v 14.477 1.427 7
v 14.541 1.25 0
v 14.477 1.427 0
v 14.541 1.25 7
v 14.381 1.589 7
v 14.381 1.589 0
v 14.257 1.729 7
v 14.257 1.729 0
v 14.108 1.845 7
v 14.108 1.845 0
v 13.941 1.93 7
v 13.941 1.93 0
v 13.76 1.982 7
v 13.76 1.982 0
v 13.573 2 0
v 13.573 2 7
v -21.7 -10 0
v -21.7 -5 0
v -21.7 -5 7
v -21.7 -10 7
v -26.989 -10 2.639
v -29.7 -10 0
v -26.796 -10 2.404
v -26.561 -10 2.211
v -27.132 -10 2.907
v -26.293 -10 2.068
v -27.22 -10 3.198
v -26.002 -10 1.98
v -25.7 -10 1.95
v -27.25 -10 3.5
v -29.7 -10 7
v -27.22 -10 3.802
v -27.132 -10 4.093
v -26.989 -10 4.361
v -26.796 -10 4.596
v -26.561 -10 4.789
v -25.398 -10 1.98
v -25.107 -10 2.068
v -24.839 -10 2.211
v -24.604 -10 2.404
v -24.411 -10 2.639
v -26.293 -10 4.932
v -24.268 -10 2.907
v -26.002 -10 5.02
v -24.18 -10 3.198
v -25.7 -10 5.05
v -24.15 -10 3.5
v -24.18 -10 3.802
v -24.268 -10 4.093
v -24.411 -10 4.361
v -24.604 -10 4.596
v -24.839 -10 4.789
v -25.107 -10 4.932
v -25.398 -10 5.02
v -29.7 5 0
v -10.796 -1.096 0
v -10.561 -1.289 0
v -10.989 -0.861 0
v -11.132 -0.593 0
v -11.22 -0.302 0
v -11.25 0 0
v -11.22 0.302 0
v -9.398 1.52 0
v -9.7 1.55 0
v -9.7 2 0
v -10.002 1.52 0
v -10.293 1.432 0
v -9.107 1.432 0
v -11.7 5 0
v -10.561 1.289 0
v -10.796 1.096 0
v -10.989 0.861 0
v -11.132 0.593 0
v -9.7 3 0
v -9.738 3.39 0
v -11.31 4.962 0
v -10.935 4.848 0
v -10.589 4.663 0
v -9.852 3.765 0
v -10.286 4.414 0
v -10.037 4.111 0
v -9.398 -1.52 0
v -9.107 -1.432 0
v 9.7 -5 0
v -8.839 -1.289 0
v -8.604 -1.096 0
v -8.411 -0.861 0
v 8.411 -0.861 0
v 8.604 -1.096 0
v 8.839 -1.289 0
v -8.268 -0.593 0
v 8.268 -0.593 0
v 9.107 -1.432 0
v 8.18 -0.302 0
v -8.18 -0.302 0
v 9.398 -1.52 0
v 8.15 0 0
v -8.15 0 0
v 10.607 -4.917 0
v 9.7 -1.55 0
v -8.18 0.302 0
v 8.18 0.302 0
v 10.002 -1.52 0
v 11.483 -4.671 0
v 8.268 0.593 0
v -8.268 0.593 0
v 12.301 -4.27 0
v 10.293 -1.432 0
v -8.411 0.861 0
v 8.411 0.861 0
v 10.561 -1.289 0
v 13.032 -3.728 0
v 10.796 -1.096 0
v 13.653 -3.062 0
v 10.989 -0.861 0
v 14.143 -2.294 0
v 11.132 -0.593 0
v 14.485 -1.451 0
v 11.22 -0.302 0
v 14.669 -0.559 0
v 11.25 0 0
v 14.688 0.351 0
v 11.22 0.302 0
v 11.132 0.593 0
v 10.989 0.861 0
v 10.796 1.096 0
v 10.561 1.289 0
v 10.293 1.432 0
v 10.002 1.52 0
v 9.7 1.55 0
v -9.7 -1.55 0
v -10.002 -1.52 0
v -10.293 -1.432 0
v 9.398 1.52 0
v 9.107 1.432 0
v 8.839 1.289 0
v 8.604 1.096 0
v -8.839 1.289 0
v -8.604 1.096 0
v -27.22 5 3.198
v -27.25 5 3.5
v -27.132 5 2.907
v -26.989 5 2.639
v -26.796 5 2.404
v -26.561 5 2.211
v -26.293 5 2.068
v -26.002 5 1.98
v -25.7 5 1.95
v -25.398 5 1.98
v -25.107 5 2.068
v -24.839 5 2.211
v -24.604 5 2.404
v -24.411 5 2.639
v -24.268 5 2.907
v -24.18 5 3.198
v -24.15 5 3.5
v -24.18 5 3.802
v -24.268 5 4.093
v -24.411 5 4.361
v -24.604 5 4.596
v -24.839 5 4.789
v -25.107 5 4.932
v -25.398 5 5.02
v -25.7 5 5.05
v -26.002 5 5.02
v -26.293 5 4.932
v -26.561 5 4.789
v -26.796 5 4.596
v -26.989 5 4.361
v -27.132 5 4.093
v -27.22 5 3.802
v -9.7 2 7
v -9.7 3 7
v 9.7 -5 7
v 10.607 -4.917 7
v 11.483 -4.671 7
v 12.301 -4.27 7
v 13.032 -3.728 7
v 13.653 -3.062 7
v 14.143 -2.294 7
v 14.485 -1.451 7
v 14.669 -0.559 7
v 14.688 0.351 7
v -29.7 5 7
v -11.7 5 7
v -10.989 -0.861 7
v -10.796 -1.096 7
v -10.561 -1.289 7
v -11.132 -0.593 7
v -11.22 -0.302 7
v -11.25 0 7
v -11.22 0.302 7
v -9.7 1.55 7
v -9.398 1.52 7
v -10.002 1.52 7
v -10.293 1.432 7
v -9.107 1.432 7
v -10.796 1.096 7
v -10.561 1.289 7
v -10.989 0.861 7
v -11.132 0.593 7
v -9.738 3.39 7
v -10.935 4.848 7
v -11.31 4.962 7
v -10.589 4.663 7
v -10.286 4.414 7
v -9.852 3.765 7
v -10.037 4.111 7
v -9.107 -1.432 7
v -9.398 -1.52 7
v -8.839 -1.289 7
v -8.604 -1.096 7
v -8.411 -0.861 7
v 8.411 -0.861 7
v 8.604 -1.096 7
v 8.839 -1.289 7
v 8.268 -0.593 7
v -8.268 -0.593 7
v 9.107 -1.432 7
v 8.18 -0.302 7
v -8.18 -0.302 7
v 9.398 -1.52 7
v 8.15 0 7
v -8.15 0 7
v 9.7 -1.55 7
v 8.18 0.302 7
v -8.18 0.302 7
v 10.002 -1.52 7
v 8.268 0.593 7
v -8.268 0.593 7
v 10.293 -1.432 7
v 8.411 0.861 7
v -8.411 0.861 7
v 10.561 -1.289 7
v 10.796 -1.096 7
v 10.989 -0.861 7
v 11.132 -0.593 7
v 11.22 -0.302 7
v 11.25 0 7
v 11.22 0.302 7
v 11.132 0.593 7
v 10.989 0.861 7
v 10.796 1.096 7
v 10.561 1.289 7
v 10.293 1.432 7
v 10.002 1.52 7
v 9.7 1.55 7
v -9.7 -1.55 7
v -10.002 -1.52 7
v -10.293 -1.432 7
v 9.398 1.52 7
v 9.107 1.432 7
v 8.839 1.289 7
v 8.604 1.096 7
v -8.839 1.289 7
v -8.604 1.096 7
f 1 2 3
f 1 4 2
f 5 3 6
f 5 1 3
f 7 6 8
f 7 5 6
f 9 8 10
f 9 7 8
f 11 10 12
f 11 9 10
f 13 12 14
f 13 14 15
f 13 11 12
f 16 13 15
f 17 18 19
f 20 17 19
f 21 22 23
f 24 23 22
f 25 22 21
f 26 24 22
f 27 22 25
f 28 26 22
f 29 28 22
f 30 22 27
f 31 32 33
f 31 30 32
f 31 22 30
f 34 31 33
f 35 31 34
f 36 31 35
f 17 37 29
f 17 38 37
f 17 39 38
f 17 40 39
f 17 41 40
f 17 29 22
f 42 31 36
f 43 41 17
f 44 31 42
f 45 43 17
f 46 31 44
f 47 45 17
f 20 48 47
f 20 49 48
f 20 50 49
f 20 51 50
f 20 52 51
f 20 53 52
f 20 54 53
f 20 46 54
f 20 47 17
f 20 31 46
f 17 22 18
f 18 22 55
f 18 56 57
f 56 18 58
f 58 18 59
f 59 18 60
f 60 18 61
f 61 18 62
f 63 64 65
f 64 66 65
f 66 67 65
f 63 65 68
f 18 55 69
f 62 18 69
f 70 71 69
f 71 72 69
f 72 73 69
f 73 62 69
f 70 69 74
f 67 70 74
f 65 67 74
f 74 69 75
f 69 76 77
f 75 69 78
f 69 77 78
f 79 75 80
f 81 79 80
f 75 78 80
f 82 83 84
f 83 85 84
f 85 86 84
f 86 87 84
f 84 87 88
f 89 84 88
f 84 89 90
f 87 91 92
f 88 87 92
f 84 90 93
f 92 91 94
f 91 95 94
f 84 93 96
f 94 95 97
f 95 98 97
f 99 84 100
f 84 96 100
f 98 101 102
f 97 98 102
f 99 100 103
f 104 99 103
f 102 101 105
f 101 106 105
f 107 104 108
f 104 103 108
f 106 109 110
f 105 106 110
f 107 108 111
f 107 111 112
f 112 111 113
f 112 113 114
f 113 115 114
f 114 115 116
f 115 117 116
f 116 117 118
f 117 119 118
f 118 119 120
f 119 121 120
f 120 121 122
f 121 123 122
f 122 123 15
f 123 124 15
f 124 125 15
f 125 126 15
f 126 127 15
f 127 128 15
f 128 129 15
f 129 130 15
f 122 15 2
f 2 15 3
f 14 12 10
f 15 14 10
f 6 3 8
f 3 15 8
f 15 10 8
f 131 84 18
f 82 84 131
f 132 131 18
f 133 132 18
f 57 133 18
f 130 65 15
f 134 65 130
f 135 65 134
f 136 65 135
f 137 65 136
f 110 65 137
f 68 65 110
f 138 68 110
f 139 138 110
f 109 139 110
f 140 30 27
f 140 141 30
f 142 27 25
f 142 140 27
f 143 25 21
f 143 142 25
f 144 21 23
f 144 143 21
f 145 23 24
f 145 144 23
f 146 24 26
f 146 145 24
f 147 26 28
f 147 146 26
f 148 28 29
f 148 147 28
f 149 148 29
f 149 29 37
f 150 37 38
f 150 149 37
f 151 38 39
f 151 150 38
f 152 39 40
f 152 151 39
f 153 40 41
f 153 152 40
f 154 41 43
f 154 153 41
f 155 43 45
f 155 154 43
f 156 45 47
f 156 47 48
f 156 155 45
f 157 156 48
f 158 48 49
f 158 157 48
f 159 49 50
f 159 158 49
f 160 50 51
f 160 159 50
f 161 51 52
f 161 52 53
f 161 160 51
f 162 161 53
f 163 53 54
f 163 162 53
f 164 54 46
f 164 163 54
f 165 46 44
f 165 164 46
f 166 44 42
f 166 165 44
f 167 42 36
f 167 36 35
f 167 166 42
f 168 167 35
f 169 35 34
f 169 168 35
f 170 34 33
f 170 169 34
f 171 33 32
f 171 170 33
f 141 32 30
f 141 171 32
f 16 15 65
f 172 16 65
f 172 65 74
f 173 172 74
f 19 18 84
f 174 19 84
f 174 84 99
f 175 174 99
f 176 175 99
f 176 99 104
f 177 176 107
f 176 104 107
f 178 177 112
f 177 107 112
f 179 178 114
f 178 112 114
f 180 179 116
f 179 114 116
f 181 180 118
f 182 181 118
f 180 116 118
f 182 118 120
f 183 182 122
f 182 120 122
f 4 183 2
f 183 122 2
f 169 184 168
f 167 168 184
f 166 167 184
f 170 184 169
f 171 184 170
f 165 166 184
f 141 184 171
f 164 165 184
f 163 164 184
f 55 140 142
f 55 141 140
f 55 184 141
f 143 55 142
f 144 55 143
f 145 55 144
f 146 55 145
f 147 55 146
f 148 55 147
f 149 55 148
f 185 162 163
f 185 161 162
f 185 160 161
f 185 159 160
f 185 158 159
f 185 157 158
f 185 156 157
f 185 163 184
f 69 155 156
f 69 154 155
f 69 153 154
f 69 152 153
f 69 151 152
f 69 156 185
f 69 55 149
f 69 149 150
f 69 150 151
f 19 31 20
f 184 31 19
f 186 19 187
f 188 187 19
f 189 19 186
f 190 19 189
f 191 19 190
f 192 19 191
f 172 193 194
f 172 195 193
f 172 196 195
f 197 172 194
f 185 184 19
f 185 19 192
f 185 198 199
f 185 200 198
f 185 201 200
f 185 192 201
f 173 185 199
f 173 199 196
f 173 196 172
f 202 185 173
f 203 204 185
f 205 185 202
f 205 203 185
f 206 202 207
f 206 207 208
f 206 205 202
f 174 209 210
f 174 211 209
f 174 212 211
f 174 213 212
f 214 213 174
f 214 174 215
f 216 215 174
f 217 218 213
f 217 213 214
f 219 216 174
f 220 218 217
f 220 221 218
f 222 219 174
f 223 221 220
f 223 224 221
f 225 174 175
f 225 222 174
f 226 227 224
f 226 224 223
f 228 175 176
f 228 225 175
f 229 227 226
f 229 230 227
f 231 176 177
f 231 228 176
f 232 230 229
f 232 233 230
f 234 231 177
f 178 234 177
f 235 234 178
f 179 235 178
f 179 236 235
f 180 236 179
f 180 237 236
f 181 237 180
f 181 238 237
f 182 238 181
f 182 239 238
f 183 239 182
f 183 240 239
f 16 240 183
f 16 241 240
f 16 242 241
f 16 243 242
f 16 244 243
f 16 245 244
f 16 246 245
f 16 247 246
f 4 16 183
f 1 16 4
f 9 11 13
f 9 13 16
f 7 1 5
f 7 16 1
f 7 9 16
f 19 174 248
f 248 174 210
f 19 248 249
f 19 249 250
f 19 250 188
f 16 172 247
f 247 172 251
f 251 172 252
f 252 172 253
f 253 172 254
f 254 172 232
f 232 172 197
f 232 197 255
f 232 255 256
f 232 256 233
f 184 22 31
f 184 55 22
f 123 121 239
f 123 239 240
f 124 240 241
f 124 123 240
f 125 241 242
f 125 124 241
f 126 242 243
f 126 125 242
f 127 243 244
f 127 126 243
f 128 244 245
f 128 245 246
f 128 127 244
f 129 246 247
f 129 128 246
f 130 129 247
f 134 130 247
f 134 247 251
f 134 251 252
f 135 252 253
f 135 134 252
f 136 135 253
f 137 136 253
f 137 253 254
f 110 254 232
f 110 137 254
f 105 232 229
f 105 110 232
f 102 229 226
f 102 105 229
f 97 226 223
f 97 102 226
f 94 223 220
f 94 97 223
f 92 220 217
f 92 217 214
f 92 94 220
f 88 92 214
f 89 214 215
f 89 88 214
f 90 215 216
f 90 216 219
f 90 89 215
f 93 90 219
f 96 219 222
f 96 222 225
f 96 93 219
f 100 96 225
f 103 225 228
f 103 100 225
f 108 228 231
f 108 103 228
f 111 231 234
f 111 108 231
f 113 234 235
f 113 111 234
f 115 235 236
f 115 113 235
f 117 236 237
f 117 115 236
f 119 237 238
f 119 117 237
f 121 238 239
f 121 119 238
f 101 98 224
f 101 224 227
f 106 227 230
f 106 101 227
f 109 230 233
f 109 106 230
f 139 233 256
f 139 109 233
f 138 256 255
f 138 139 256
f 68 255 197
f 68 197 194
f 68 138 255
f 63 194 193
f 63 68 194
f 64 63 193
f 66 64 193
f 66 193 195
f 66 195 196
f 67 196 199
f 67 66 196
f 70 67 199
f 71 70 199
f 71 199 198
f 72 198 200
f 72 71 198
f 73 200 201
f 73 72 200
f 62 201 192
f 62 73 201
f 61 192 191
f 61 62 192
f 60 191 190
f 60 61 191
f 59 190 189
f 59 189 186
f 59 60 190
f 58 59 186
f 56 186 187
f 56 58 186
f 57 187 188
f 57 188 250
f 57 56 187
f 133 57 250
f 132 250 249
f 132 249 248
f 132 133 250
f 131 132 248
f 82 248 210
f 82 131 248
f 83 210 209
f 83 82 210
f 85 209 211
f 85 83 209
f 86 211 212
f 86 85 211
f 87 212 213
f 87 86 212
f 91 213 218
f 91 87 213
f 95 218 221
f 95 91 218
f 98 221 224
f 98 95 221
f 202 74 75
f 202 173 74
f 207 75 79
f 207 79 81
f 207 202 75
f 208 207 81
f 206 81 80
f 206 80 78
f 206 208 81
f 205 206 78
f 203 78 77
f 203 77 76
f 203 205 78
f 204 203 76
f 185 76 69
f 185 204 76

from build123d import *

# Parameters (mm, degrees)
CROQUIS1_R              = 1.55
SALIENTE_EXTRUIR1_DEPTH = 7
REDONDEO1_R             = 1
REDONDEO2_R             = 2
CROQUIS2_R              = 1.55
CORTAR_EXTRUIR1_DEPTH   = 33.110590153
CROQUIS3_W              = 8
CROQUIS3_H              = 7
CROQUIS3_R              = 1.55
SALIENTE_EXTRUIR2_DEPTH = 5


with BuildPart() as part:
    # Croquis1 → Saliente-Extruir1 (new body)
    # profile 1 of 3: a face of its own
    with BuildSketch(Plane.XY):
        with BuildLine():
            ThreePointArc((-9.7, 5), (-14.7, 0), (-9.7, -5))
            Line((-9.7, -5), (-29.7, -5))
            Line((-29.7, -5), (-29.7, 5))
            Line((-29.7, 5), (-9.7, 5))
        make_face()
    # profile 2 of 3: a face of its own
    with BuildSketch(Plane.XY):
        with BuildLine():
            Line((14.282575695, 2), (-9.7, 2))
            Line((-9.7, 2), (-14.282575695, 2))
            ThreePointArc((-14.282575695, 2), (-13.883300133, -2.738612788), (-9.7, -5))
            Line((-9.7, -5), (9.7, -5))
            ThreePointArc((9.7, -5), (13.883300133, -2.738612788), (14.282575695, 2))
        make_face()
        with Locations((-9.7, 0)):
            Circle(CROQUIS1_R, mode=Mode.SUBTRACT)
        with Locations((9.7, 0)):
            Circle(CROQUIS1_R, mode=Mode.SUBTRACT)
    # profile 3 of 3: a face of its own
    with BuildSketch(Plane.XY):
        with BuildLine():
            Line((-9.7, 2), (-9.7, 5))
            ThreePointArc((-9.7, 5), (-12.438612788, 4.183300133), (-14.282575695, 2))
            Line((-14.282575695, 2), (-9.7, 2))
        make_face()
    extrude(amount=SALIENTE_EXTRUIR1_DEPTH)

    # Redondeo1
    redondeo1_edges = [part.edges().sort_by_distance(p)[0] for p in [
        (14.282575695, 2, 3.5),
    ]]
    fillet(redondeo1_edges, radius=REDONDEO1_R)

    # Redondeo2
    redondeo2_edges = [part.edges().sort_by_distance(p)[0] for p in [
        (-9.7, 5, 3.5),
    ]]
    fillet(redondeo2_edges, radius=REDONDEO2_R)

    # Croquis2 → Cortar-Extruir1 (cut, through all)
    with BuildSketch(Plane(origin=(0, 5, 0), x_dir=(1, 0, 0), z_dir=(0, 1, 0))):
        with Locations(Location((-25.7, -3.5, 0), (0, 0, 180))):
            Circle(CROQUIS2_R)
    extrude(amount=-CORTAR_EXTRUIR1_DEPTH, mode=Mode.SUBTRACT)

    # Croquis3 → Saliente-Extruir2 (add)
    with BuildSketch(Plane.XZ.offset(5)):
        with Locations((-25.7, 3.5)):
            Rectangle(CROQUIS3_W, CROQUIS3_H)
        with Locations(Location((-25.7, 3.5, 0), (0, 0, 180))):
            Circle(CROQUIS3_R, mode=Mode.SUBTRACT)
    extrude(amount=SALIENTE_EXTRUIR2_DEPTH)


solid = part.part
